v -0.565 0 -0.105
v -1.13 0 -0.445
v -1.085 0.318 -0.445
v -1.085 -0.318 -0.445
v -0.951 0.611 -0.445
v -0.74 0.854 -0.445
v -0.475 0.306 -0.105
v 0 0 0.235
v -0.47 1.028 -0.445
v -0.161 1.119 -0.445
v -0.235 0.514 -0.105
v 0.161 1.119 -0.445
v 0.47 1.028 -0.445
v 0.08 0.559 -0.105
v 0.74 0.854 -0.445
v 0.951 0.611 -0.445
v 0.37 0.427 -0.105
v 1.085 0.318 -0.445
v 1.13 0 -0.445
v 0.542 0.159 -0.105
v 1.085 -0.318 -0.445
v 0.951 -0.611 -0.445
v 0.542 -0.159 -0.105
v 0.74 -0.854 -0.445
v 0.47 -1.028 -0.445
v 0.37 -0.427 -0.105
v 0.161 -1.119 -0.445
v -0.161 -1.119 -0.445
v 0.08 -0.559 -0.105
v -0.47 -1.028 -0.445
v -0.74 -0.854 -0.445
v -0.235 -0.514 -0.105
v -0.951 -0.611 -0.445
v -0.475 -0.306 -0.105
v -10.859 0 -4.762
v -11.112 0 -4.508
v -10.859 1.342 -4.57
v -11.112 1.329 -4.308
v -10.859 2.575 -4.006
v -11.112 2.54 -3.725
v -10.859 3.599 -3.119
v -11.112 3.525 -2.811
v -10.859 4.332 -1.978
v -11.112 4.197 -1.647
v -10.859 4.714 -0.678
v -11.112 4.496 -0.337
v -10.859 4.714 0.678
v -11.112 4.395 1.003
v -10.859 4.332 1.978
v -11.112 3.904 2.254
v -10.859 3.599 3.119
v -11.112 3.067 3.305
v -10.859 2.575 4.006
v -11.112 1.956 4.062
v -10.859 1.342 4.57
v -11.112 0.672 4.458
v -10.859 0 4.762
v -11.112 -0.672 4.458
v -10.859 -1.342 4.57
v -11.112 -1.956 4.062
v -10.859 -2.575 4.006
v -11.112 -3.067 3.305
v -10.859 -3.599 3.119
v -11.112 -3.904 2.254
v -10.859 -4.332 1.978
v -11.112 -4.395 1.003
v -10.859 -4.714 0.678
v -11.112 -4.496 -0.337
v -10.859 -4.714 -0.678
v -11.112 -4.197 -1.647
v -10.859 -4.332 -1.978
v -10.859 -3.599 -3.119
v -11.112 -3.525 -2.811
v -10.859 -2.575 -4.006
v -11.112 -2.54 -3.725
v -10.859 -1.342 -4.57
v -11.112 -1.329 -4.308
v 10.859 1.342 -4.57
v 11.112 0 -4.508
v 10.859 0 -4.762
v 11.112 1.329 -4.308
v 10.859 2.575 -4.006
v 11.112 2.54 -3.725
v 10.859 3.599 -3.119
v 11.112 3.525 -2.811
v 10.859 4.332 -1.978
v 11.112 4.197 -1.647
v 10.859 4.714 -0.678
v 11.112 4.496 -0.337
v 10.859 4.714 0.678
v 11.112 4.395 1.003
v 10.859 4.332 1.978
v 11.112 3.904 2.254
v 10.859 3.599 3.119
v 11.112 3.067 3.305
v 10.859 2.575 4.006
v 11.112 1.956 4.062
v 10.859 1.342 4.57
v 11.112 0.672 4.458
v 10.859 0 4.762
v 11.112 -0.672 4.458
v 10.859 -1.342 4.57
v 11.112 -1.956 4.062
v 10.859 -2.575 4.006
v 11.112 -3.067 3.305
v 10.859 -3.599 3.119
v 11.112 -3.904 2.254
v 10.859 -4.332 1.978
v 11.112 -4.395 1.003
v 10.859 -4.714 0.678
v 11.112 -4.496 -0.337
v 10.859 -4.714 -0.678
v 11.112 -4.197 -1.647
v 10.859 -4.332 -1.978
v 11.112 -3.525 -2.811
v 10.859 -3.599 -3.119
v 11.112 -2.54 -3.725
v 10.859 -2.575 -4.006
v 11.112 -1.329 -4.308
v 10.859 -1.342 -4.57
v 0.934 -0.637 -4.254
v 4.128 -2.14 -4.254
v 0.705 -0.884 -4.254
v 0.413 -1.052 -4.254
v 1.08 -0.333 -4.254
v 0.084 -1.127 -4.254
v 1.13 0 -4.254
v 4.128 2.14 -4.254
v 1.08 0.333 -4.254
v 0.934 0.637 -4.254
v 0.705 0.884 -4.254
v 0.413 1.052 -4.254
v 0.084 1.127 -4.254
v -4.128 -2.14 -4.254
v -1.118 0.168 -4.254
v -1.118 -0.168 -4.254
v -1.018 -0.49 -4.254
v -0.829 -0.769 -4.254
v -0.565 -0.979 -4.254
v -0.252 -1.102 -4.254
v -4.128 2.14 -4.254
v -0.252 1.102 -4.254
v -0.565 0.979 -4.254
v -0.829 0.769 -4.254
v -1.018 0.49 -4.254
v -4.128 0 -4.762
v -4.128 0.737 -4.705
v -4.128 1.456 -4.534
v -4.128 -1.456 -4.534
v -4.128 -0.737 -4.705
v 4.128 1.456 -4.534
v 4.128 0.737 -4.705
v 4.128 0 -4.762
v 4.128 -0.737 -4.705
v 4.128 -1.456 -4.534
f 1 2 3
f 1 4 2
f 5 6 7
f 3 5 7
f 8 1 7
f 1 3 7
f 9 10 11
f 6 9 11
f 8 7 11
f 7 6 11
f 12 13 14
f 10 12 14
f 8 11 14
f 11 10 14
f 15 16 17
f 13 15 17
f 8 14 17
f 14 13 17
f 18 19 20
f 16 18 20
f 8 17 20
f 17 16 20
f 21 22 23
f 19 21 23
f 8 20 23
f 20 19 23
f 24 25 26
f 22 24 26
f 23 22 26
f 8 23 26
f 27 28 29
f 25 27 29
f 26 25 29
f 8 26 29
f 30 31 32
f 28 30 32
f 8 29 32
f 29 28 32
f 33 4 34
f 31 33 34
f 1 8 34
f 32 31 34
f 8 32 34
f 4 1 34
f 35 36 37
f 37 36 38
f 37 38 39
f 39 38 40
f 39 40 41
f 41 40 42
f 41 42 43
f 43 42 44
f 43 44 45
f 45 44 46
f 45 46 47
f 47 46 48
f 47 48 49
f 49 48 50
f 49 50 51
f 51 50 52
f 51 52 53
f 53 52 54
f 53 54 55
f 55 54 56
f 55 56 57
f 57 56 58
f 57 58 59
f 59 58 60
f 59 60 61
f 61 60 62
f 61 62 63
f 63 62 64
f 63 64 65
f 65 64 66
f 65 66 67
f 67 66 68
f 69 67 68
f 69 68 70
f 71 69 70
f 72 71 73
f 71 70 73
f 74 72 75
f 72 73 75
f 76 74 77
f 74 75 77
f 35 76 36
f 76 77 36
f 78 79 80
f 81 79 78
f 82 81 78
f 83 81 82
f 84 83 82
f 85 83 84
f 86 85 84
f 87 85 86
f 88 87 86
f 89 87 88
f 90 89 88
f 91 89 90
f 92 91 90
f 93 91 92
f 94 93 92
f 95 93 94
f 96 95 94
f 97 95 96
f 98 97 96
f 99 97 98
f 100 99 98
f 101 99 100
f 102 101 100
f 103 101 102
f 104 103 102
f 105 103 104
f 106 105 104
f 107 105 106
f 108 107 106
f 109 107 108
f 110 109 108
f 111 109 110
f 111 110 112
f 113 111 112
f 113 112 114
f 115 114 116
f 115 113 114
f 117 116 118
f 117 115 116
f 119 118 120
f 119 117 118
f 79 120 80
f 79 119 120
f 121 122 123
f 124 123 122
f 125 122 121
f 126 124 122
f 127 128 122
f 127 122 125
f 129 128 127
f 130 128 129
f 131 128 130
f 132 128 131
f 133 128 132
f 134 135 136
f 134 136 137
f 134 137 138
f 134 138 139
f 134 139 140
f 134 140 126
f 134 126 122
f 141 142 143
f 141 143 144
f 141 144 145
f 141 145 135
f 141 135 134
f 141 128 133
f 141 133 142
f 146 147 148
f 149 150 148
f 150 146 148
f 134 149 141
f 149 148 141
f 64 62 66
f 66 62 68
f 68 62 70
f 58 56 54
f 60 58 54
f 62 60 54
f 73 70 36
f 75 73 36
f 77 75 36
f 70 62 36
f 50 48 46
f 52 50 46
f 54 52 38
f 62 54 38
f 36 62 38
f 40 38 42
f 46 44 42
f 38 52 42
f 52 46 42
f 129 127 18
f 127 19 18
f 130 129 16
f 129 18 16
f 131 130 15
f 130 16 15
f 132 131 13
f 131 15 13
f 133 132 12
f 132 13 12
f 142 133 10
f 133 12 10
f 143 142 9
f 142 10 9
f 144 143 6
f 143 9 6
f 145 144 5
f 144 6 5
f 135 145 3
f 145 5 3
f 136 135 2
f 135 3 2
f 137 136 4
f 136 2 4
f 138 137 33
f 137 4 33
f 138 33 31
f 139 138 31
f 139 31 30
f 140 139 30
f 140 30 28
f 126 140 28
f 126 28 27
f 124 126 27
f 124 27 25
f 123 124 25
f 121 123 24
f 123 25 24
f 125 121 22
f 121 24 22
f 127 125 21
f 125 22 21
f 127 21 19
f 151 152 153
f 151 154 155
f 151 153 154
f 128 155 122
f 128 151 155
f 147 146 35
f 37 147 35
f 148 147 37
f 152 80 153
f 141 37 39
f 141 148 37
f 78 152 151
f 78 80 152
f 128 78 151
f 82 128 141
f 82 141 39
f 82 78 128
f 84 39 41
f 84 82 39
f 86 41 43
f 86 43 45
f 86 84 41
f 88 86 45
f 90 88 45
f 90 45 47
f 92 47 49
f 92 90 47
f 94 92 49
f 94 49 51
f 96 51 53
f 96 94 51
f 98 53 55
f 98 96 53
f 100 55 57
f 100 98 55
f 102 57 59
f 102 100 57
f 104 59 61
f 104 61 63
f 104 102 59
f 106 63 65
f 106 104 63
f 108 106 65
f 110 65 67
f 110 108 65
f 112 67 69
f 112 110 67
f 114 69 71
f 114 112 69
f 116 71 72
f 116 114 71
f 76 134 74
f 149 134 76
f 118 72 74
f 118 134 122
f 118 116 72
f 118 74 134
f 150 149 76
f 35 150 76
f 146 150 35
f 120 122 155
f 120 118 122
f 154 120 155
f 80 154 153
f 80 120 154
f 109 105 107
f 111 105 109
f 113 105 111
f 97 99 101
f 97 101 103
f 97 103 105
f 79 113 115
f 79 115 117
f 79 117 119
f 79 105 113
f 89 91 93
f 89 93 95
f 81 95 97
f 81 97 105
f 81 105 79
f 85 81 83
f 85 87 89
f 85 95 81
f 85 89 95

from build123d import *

# Parameters (mm, degrees)
SKETCH1_R                 = 4.7625
BOSS_EXTRUDE1_DEPTH       = 11.1125
SKETCH2_W                 = 8.255
SKETCH2_H                 = 9.525
CUT_EXTRUDE1_DEPTH        = 0.508
F_4_40_TAPPED_HOLE1_D     = 2.2606
F_4_40_TAPPED_HOLE1_DEPTH = 3.81
F_4_40_TAPPED_HOLE1_TIP   = 0.679152758
CHAMFER1_SIZE             = 0.254


with BuildPart() as part:
    # Sketch1 → Boss-Extrude1 (new body, symmetric)
    with BuildSketch(Plane(origin=(0, 0, 0), x_dir=(0, 0, -1), z_dir=(1, 0, 0))):
        Circle(SKETCH1_R)
    extrude(amount=BOSS_EXTRUDE1_DEPTH, both=True)

    # Sketch2 → Cut-Extrude1 (cut)
    with BuildSketch(Plane(origin=(0, 0, -4.7625), x_dir=(-1, 0, 0), z_dir=(0, 0, -1))):
        Rectangle(SKETCH2_W, SKETCH2_H)
    extrude(amount=-CUT_EXTRUDE1_DEPTH, mode=Mode.SUBTRACT)

    # #4-40 Tapped Hole1
    with Locations(Plane(origin=(0, 0, -4.2545), x_dir=(-1, 0, 0), z_dir=(0, 0, -1))):
        with Locations((0, 0)):
            Hole(F_4_40_TAPPED_HOLE1_D / 2, depth=F_4_40_TAPPED_HOLE1_DEPTH)
            with Locations((0, 0, -(F_4_40_TAPPED_HOLE1_DEPTH + F_4_40_TAPPED_HOLE1_TIP / 2))):  # 118° drill point
                Cone(0, F_4_40_TAPPED_HOLE1_D / 2, F_4_40_TAPPED_HOLE1_TIP, mode=Mode.SUBTRACT)

    # Chamfer1
    chamfer1_edges = [part.edges().sort_by_distance(p)[0] for p in [
        (-11.1125, 0, 4.7625),
        (11.1125, 0, 4.7625),
    ]]
    chamfer(chamfer1_edges, length=CHAMFER1_SIZE)


solid = part.part
